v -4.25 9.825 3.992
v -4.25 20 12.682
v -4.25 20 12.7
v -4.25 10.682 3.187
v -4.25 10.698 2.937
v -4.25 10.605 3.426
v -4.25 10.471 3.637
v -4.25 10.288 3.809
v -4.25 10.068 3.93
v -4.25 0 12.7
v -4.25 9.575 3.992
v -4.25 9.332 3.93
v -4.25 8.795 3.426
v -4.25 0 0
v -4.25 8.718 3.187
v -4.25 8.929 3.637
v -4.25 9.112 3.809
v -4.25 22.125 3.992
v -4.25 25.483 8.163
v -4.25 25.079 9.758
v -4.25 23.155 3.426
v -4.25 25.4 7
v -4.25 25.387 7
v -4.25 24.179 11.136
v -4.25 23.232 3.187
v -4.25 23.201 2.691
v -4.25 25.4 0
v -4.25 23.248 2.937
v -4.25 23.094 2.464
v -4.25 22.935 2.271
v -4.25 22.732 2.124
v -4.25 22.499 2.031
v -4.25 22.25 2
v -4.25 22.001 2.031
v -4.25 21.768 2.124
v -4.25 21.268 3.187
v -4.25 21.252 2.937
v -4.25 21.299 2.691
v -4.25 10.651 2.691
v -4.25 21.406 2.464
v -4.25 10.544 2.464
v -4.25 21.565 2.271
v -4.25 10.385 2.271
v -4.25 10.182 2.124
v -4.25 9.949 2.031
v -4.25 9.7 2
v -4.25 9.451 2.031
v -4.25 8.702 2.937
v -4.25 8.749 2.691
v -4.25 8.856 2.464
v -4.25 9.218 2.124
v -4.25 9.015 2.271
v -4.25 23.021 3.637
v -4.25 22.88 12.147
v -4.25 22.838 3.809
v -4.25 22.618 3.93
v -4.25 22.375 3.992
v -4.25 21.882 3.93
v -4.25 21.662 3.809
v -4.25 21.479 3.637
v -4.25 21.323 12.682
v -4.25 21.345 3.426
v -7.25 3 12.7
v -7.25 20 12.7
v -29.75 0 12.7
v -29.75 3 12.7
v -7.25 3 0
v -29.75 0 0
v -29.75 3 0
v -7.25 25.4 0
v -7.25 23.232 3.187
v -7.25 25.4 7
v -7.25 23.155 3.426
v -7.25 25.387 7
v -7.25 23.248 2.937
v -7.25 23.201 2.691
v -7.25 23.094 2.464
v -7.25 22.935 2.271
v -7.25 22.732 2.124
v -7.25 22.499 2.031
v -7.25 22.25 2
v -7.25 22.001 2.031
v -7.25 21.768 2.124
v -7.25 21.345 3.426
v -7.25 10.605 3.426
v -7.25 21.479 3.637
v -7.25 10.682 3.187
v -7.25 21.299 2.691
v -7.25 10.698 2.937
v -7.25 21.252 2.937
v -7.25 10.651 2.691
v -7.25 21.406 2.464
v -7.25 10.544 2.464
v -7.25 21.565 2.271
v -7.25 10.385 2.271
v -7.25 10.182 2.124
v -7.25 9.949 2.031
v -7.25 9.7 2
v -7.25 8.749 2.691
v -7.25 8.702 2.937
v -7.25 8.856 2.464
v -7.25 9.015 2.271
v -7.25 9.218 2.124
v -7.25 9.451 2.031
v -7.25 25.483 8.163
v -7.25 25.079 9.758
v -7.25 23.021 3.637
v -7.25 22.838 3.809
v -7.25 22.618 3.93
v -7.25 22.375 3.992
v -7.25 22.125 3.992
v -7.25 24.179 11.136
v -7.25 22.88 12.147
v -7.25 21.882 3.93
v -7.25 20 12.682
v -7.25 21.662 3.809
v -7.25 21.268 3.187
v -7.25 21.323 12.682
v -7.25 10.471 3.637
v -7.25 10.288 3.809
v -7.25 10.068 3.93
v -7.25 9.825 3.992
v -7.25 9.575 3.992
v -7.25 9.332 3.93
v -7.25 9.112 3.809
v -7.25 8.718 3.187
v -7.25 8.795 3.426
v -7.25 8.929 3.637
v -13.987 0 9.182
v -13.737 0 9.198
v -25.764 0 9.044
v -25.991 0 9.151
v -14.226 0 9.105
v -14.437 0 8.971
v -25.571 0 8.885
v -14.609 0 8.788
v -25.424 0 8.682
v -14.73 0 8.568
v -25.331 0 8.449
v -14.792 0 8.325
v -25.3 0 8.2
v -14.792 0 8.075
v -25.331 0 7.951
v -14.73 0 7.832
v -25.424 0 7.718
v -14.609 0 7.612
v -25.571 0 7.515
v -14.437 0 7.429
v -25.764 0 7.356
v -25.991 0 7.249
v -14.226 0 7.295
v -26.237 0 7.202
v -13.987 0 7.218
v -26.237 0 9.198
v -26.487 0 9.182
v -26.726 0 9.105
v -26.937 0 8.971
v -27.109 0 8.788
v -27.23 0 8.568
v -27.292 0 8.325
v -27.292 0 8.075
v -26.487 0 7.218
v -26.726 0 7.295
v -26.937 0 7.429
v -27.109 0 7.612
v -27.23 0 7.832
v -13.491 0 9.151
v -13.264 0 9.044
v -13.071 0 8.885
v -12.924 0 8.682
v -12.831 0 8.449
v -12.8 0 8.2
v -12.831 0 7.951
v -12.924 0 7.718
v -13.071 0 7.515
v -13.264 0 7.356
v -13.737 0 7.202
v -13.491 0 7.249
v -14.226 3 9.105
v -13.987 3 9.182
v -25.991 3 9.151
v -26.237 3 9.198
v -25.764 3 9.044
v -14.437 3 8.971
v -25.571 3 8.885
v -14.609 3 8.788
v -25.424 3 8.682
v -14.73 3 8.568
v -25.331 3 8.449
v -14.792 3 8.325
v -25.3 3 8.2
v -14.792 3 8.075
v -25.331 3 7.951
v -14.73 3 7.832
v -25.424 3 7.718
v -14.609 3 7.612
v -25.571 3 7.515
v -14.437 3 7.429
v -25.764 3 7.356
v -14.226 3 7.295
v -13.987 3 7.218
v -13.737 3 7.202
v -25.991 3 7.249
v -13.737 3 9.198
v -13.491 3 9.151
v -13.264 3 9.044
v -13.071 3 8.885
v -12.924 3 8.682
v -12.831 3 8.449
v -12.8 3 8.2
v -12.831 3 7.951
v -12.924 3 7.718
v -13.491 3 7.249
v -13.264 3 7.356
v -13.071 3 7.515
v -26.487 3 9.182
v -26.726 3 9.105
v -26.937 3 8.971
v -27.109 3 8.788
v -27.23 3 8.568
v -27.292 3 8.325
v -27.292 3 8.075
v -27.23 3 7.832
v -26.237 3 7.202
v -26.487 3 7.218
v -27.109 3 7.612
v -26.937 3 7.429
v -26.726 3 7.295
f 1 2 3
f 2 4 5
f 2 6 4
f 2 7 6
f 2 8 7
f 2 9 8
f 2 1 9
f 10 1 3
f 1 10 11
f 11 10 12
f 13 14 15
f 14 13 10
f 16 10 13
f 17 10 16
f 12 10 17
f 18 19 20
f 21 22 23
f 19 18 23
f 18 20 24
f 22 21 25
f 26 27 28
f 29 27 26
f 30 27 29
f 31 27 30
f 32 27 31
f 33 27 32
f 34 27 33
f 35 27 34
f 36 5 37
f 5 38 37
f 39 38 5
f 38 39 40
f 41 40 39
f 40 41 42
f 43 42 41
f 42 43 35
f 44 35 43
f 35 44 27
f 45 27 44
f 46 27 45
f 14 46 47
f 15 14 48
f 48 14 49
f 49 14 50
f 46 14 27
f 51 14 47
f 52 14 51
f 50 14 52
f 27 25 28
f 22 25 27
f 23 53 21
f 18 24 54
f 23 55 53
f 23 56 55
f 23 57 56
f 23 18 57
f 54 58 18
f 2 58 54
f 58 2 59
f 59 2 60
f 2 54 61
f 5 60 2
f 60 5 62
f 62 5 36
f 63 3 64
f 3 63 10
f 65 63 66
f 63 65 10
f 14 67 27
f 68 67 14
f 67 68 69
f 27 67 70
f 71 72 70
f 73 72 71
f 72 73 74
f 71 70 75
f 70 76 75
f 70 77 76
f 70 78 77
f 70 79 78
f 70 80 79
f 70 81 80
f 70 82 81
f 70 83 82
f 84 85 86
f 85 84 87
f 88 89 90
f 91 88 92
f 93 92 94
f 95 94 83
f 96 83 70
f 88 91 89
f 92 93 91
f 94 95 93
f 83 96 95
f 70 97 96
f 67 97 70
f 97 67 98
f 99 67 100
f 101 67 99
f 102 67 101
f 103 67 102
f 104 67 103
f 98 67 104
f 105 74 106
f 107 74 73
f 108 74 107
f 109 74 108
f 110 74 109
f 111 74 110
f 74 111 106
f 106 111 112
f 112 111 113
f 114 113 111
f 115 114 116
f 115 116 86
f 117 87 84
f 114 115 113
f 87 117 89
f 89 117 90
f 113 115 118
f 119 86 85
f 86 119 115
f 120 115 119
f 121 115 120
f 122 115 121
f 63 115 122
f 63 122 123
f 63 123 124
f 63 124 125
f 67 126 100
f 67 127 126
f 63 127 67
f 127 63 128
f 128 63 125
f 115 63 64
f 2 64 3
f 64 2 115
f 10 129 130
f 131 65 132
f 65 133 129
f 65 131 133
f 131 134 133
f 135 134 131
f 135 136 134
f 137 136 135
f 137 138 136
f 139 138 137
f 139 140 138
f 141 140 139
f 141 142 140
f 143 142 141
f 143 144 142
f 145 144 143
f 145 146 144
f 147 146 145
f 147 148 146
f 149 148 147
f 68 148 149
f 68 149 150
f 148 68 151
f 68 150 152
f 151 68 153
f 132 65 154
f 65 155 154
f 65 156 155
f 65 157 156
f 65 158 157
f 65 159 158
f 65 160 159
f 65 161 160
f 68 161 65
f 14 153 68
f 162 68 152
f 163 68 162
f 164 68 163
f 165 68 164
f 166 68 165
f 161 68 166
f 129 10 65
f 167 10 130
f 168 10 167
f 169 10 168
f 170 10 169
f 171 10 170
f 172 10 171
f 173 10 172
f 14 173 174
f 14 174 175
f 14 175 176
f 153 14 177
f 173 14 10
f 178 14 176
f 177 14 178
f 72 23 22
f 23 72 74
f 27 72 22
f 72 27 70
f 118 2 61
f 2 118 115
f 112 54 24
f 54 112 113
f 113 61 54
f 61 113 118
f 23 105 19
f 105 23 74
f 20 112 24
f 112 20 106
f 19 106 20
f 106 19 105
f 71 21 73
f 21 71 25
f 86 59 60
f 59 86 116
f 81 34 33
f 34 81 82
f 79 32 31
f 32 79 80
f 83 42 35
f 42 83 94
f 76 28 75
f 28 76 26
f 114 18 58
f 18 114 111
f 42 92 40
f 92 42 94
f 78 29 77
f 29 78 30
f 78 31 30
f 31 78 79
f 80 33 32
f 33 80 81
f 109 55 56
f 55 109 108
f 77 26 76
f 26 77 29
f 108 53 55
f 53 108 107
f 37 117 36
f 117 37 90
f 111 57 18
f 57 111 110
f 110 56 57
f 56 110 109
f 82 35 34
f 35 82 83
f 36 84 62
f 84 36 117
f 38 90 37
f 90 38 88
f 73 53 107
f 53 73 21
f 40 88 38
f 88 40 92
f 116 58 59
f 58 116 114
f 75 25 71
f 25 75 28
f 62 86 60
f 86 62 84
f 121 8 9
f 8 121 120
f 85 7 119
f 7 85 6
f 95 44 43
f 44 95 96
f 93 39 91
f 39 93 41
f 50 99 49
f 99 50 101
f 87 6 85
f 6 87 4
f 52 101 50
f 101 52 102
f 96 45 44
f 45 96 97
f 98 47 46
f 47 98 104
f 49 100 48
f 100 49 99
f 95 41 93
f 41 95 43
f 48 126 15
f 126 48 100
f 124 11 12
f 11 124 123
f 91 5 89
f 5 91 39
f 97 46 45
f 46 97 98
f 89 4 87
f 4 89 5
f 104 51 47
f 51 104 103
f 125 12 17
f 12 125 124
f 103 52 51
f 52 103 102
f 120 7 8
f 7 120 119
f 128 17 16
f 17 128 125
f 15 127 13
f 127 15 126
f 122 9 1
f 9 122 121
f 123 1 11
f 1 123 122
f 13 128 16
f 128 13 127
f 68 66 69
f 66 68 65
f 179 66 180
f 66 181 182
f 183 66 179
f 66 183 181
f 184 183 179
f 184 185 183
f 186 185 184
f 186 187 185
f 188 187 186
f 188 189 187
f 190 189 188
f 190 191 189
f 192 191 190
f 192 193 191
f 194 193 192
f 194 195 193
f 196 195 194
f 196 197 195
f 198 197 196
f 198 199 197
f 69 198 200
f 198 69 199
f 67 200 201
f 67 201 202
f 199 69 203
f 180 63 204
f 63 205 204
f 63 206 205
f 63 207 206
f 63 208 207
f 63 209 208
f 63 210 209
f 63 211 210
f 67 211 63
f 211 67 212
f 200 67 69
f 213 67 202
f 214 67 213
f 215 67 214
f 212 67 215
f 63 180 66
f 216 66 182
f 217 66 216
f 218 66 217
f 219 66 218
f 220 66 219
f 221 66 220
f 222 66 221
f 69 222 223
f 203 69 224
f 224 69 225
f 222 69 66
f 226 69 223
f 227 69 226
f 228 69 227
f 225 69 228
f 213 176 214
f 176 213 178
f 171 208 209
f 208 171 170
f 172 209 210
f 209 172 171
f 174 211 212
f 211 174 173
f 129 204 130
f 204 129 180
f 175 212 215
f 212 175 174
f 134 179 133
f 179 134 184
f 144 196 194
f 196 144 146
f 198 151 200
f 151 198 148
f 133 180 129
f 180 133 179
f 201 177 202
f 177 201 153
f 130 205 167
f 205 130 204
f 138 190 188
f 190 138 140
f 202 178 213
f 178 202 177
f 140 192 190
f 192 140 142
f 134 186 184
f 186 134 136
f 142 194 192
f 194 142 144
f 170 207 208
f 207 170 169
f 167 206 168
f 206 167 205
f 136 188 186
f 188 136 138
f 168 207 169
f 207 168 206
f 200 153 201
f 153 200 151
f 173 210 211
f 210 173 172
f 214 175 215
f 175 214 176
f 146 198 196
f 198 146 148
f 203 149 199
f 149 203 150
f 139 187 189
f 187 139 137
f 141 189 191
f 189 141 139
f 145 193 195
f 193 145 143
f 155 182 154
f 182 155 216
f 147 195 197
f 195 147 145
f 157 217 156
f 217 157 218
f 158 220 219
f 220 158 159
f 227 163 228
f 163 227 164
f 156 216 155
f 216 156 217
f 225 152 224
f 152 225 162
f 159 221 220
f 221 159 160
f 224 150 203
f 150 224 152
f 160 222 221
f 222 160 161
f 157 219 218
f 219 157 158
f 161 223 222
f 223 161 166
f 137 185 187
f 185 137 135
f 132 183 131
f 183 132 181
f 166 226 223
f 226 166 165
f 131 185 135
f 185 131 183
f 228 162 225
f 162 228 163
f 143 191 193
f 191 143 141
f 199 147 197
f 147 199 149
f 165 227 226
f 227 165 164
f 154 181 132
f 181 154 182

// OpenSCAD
//DIEGO GARCIA GONZALEZ UO294255

bracket(); 
fn_cylinder = 25;
fn_cylinder_2 = 19;

// FIGURA FINAL --------------------------------------

module bracket() {
    parDeTapasCirculares();
    parDeTapasCuadradas();
    
}

// PAREJA DE TAPAS CIRCULARES  ------------------------
module parDeTapasCirculares(){
    tapaCircularConAgujeros();
//    translate([-45, -14.2, 0]) {
//        mirror([1, 0, 0]) {
//            tapaCircularConAgujeros();
//        }
//    }
}

// PAREJA DE TAPAS CUADRADAS  ------------------------
module parDeTapasCuadradas(){
    tapaCuadradaConAgujeros();
//    translate([-45, -14.2, 0]) {
//        mirror([1, 0, 0]) {
//            tapaCuadradaConAgujeros();/
//        }
//    }
}
    

module tapaCuadradaConAgujeros() {
    difference() {
        tapaCuadrada();
        rotate([90, 0, 0]) { 
            translate([-13.8, 8.2, -3.5]) {
                cylinder(h = 4, r = 1, $fn = fn_cylinder);
            }
        }
        rotate([90, 0, 0]) { 
            translate([-26.3, 8.2, -3.5]) {
                cylinder(h = 4, r = 1, $fn = fn_cylinder);
            }
        }
    }
}

module tapaCuadrada() {
    translate([-29.75, 0, 0])
        cube([25.5, 3, 12.7]);
}

module tapaCircularConAgujeros() {
    difference() {
        tapaCircular();
        rotate([0, 90, 0]) { 
            translate([-3, 22.25, -7.3]) {
                cylinder(h = 4, r = 1, $fn = fn_cylinder);
            }
        }
        rotate([0, 90, 0]) { 
            translate([-3, 9.7, -7.3]) {
                cylinder(h = 4, r = 1, $fn = fn_cylinder);
            }
        }
    }
}

module tapaCircular() {
    translate([-7.25, 0, 0]) {
        cube([3, 20, 12.7]);
    }
    translate([-7.25, 0, 0]) {
        cube([3, 25.4, 7]);
    }
    rotate([0, 90, 0]) { 
        translate([-7.75, 20.5, -7.25]) {
            cylinder(h = 3, r = 5, $fn = fn_cylinder_2);
        }
    }
}
